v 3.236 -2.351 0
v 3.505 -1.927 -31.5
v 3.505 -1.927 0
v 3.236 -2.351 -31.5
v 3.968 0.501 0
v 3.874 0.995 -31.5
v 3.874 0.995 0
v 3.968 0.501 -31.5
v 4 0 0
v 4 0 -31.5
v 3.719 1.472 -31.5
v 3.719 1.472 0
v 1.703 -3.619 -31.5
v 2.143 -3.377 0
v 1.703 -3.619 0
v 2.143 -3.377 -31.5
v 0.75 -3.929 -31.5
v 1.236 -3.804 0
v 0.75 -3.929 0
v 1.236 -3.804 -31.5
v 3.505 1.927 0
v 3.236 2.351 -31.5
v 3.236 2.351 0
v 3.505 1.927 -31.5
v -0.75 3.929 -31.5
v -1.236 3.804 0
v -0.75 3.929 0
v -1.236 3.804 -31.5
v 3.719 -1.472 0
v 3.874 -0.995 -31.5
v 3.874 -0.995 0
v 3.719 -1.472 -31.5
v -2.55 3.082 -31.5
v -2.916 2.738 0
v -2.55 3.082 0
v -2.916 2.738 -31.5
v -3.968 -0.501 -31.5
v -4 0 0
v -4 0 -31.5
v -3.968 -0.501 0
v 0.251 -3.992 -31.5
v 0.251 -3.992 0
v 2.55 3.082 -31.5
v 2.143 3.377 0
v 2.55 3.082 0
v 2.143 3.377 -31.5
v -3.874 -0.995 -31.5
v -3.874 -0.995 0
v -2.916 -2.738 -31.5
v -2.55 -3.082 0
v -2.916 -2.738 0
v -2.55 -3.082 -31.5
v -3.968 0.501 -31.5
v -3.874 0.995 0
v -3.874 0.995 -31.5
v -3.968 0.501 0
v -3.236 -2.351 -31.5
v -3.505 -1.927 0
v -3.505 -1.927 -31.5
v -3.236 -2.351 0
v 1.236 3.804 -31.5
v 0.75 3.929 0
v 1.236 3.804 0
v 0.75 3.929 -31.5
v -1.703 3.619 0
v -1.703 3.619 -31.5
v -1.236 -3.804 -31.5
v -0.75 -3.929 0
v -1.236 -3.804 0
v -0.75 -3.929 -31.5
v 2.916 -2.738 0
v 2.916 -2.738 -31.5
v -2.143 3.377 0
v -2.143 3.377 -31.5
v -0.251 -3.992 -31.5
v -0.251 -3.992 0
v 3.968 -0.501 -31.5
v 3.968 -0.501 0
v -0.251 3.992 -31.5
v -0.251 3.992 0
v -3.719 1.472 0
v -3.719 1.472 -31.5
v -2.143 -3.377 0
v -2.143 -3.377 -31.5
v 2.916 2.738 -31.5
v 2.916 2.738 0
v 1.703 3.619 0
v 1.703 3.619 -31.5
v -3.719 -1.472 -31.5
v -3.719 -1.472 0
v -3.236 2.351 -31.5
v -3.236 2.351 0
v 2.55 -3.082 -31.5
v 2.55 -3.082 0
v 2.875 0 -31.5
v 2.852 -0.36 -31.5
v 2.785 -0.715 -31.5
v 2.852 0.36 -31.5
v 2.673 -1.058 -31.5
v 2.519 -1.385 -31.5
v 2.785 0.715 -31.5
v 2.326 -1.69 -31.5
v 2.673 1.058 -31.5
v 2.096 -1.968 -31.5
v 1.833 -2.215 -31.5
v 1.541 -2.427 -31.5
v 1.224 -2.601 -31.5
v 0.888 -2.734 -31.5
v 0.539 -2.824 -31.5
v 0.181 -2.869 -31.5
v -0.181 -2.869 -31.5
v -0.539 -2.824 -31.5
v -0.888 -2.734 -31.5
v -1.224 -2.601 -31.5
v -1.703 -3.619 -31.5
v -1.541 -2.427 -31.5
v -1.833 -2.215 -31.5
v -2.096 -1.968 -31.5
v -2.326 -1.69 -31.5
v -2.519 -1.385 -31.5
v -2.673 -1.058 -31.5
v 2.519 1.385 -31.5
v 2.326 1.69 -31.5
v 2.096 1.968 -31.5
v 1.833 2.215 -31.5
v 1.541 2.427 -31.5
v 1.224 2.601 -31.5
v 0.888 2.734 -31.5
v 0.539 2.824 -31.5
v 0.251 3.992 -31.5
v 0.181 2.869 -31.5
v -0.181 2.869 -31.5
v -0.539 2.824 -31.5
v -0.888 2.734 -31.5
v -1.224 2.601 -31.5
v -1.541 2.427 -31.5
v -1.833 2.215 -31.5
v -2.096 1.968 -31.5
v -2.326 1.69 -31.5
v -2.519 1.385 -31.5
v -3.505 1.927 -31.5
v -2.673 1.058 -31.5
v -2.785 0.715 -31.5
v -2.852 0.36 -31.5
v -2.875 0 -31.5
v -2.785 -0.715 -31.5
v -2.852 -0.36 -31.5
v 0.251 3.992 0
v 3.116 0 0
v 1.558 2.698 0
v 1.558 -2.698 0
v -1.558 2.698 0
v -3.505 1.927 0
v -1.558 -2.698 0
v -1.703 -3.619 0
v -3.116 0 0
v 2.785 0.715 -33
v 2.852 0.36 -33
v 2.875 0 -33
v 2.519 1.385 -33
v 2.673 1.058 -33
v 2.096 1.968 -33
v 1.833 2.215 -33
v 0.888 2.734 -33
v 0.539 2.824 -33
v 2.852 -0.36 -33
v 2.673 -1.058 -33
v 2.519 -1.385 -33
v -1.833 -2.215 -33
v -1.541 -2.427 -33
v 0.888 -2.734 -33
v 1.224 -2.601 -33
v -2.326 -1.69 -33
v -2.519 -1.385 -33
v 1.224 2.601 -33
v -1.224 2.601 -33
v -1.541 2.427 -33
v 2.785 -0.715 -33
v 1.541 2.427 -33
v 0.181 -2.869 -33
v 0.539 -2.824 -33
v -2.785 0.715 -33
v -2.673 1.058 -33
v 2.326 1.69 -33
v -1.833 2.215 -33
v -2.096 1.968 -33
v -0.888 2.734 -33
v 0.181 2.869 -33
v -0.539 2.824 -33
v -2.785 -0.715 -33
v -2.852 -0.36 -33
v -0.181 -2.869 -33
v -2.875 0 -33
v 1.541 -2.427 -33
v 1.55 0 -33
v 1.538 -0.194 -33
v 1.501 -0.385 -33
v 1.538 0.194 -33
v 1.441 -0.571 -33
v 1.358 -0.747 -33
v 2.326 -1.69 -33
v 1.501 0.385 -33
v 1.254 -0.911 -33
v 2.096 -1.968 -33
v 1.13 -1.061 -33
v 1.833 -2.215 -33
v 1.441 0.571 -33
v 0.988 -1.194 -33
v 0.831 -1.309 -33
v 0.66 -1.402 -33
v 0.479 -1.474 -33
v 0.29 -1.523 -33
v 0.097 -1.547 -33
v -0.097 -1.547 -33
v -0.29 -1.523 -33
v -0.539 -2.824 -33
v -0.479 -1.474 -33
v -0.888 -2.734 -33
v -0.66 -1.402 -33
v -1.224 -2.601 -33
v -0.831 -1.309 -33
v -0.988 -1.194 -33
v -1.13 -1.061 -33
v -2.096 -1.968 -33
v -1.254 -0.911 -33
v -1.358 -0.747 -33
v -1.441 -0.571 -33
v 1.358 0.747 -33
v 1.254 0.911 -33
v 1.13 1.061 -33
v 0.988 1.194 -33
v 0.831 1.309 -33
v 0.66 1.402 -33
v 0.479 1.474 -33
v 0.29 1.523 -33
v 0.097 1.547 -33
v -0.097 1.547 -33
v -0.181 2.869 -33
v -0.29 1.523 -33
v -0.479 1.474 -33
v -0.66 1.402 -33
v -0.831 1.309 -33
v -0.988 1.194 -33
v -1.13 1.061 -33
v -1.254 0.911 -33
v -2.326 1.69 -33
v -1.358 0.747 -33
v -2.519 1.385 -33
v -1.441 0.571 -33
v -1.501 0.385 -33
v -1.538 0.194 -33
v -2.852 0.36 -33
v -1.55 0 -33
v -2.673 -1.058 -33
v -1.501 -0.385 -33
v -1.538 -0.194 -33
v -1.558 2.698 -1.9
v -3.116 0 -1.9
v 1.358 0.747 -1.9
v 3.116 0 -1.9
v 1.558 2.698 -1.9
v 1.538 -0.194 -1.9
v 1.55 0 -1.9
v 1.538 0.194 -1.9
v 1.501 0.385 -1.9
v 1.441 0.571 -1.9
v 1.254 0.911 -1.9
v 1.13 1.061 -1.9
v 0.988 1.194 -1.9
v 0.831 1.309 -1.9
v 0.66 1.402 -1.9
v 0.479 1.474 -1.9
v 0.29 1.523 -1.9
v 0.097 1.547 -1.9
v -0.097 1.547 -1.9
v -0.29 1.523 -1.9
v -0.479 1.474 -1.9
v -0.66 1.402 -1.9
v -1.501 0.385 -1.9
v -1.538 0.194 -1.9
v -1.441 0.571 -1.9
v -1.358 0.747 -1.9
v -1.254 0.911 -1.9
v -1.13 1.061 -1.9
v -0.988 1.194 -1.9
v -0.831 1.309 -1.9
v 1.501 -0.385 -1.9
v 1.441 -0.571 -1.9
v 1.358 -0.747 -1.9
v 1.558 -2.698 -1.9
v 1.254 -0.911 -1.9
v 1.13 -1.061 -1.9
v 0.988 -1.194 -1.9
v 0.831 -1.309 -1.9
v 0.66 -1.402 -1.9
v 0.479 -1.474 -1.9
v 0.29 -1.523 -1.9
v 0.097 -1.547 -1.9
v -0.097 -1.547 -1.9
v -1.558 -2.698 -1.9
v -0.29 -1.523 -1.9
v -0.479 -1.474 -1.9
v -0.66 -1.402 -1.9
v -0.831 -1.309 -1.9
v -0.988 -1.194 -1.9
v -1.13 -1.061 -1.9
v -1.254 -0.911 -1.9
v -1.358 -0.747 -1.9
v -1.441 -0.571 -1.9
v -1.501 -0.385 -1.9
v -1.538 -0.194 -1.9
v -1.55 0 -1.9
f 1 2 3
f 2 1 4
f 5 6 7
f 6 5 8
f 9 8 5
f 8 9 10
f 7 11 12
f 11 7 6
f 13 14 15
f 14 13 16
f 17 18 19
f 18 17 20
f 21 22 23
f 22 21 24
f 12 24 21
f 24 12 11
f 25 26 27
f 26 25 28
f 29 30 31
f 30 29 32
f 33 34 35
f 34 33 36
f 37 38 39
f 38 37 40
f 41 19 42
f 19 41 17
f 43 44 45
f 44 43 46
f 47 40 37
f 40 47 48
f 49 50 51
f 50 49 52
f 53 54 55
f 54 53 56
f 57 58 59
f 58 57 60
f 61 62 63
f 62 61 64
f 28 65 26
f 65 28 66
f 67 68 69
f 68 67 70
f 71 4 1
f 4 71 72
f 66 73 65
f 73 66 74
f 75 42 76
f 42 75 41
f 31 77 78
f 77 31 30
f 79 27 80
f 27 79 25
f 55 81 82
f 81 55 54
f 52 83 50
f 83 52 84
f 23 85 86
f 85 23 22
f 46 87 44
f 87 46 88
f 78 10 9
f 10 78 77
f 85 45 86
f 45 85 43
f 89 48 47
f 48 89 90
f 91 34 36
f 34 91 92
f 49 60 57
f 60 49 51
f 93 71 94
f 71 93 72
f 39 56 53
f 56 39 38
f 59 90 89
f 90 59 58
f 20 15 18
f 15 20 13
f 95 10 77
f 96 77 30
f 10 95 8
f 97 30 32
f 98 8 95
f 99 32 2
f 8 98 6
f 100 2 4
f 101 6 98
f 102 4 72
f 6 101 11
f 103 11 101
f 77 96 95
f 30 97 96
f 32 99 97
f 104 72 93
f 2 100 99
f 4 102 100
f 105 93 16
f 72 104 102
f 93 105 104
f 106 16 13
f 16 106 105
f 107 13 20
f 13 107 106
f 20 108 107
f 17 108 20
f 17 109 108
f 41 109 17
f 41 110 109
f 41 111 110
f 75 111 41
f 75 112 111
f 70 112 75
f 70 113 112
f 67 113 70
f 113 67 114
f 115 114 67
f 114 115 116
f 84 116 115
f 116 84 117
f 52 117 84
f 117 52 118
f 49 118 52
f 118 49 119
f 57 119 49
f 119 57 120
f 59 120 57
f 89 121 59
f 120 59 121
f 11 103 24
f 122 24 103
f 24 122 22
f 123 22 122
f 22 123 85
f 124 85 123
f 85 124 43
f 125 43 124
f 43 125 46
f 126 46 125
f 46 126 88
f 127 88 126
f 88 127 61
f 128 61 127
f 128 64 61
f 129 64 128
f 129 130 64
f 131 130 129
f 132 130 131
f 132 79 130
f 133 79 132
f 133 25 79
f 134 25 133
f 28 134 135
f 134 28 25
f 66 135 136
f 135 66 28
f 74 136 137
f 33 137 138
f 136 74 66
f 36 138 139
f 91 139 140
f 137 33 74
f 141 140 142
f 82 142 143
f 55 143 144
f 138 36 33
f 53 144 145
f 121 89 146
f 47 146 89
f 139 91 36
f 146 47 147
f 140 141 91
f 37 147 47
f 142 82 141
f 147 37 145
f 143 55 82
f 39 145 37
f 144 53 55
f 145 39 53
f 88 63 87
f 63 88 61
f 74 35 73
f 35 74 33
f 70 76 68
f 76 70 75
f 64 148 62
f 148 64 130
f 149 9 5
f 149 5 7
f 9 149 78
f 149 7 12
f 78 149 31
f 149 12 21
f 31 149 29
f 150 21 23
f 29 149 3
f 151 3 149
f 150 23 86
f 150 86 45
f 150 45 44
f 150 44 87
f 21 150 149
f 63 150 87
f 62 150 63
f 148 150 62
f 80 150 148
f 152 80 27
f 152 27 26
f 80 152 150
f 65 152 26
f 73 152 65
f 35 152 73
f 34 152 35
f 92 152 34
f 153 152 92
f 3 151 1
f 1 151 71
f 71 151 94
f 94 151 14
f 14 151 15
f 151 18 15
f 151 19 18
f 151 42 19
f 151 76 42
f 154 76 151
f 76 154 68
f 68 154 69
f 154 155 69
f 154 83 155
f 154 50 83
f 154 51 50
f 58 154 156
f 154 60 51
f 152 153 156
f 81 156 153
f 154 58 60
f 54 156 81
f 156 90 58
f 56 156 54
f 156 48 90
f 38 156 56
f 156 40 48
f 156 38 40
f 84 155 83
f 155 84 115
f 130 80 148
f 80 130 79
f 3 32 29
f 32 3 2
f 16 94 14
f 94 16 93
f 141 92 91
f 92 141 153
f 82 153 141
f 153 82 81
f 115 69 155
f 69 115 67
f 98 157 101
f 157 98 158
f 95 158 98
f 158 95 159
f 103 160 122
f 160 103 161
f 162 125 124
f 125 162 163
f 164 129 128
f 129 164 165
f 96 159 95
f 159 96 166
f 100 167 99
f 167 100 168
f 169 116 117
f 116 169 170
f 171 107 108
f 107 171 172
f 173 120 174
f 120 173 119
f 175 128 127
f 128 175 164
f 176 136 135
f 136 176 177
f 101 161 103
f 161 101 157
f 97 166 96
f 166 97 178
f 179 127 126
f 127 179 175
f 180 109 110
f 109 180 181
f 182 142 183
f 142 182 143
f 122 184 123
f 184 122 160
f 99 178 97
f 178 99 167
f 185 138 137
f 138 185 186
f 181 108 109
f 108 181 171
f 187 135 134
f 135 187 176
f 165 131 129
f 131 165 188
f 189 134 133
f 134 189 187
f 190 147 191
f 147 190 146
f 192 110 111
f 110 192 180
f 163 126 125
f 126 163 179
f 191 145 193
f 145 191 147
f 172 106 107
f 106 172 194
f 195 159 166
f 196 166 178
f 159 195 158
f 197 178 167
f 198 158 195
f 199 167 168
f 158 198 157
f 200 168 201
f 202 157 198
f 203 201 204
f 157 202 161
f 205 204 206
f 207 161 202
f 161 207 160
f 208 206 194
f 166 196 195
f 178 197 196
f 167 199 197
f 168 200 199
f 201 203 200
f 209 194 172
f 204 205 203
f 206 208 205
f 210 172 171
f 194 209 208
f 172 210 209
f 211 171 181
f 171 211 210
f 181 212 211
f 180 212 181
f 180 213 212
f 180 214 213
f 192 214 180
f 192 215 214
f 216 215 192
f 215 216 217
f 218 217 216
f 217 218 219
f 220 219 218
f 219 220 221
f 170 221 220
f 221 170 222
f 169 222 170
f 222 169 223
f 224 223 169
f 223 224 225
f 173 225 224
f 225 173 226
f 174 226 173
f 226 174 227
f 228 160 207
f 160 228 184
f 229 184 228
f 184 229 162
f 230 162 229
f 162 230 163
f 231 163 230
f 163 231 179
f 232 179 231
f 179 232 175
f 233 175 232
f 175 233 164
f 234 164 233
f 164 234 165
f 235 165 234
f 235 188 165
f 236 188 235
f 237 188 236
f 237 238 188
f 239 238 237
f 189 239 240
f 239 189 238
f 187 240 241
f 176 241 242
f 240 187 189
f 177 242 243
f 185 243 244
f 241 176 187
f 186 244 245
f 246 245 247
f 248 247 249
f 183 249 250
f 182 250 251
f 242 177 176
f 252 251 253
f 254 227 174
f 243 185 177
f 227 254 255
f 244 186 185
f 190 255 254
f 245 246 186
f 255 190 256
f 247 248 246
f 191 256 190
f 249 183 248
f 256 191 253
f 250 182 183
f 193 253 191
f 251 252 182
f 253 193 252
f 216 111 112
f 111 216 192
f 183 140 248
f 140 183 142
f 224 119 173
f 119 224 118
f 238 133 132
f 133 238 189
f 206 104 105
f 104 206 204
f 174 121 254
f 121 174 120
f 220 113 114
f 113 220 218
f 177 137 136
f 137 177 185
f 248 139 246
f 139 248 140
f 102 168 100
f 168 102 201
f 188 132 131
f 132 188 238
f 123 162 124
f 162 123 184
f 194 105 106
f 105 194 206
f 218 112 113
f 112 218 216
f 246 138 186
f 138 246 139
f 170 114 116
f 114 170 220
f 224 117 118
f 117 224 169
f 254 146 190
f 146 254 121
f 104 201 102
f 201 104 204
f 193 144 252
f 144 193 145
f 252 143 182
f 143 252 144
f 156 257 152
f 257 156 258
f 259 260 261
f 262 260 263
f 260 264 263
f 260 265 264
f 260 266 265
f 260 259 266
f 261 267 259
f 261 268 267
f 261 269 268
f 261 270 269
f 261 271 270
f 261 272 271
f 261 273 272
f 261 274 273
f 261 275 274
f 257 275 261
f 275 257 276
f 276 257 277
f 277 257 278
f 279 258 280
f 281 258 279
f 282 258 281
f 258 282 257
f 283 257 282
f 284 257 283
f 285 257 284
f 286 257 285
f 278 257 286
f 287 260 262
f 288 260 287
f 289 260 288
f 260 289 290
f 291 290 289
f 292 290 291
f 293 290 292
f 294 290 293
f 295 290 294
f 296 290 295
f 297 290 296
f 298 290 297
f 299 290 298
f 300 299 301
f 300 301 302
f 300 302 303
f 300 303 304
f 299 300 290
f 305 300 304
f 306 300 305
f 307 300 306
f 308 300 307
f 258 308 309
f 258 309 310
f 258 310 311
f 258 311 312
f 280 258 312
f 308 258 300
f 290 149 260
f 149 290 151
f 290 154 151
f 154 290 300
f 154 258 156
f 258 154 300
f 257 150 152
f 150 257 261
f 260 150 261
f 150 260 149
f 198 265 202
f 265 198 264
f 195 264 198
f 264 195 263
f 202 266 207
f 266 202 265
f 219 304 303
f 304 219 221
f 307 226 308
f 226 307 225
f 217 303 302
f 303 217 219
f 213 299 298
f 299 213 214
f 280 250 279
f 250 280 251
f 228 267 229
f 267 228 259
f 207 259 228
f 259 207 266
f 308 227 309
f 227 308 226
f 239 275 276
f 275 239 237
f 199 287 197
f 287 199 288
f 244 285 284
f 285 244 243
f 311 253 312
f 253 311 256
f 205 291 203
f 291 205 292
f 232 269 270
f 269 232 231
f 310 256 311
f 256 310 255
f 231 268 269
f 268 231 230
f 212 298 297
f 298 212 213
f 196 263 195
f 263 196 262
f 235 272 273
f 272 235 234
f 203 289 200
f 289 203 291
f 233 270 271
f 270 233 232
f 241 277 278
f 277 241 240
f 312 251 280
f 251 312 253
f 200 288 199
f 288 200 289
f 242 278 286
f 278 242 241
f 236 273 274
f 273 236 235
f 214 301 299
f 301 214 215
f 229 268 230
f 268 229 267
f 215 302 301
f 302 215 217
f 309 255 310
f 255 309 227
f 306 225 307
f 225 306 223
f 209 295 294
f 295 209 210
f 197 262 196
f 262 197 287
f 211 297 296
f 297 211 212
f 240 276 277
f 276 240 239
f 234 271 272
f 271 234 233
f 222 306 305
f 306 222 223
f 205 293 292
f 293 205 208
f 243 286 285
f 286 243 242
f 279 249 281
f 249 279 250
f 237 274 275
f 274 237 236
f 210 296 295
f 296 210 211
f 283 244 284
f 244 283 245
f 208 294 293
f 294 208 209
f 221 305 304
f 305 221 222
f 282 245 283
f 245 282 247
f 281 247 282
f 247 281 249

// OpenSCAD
$fn = 50;

difference() {
	union() {
		translate(v = [0, 0, -31.5]) {
			cylinder(h = 31.5, r = 4.0);
		}
		#translate(v = [0, 0, -33.0]) {
			cylinder(h = 33, r = 2.875);
		}
	}
	union() {
		translate(v = [0, 0, 0]) {
			rotate(a = [0, 0, 0]) {
				difference() {
					union() {
						translate(v = [0, 0, -1.9]) {
							linear_extrude(height = 1.9) {
								polygon(points = [[3.1158, 0.0], [1.5579000000000005, 2.698361953111554], [-1.5578999999999994, 2.6983619531115544], [-3.1158, 3.815754496783323e-16], [-1.5579000000000014, -2.6983619531115535], [1.557899999999998, -2.6983619531115552]]);
							}
						}
					}
					union();
				}
			}
		}
		#translate(v = [0, 0, -100.0]) {
			cylinder(h = 200, r = 1.55);
		}
	}
}
